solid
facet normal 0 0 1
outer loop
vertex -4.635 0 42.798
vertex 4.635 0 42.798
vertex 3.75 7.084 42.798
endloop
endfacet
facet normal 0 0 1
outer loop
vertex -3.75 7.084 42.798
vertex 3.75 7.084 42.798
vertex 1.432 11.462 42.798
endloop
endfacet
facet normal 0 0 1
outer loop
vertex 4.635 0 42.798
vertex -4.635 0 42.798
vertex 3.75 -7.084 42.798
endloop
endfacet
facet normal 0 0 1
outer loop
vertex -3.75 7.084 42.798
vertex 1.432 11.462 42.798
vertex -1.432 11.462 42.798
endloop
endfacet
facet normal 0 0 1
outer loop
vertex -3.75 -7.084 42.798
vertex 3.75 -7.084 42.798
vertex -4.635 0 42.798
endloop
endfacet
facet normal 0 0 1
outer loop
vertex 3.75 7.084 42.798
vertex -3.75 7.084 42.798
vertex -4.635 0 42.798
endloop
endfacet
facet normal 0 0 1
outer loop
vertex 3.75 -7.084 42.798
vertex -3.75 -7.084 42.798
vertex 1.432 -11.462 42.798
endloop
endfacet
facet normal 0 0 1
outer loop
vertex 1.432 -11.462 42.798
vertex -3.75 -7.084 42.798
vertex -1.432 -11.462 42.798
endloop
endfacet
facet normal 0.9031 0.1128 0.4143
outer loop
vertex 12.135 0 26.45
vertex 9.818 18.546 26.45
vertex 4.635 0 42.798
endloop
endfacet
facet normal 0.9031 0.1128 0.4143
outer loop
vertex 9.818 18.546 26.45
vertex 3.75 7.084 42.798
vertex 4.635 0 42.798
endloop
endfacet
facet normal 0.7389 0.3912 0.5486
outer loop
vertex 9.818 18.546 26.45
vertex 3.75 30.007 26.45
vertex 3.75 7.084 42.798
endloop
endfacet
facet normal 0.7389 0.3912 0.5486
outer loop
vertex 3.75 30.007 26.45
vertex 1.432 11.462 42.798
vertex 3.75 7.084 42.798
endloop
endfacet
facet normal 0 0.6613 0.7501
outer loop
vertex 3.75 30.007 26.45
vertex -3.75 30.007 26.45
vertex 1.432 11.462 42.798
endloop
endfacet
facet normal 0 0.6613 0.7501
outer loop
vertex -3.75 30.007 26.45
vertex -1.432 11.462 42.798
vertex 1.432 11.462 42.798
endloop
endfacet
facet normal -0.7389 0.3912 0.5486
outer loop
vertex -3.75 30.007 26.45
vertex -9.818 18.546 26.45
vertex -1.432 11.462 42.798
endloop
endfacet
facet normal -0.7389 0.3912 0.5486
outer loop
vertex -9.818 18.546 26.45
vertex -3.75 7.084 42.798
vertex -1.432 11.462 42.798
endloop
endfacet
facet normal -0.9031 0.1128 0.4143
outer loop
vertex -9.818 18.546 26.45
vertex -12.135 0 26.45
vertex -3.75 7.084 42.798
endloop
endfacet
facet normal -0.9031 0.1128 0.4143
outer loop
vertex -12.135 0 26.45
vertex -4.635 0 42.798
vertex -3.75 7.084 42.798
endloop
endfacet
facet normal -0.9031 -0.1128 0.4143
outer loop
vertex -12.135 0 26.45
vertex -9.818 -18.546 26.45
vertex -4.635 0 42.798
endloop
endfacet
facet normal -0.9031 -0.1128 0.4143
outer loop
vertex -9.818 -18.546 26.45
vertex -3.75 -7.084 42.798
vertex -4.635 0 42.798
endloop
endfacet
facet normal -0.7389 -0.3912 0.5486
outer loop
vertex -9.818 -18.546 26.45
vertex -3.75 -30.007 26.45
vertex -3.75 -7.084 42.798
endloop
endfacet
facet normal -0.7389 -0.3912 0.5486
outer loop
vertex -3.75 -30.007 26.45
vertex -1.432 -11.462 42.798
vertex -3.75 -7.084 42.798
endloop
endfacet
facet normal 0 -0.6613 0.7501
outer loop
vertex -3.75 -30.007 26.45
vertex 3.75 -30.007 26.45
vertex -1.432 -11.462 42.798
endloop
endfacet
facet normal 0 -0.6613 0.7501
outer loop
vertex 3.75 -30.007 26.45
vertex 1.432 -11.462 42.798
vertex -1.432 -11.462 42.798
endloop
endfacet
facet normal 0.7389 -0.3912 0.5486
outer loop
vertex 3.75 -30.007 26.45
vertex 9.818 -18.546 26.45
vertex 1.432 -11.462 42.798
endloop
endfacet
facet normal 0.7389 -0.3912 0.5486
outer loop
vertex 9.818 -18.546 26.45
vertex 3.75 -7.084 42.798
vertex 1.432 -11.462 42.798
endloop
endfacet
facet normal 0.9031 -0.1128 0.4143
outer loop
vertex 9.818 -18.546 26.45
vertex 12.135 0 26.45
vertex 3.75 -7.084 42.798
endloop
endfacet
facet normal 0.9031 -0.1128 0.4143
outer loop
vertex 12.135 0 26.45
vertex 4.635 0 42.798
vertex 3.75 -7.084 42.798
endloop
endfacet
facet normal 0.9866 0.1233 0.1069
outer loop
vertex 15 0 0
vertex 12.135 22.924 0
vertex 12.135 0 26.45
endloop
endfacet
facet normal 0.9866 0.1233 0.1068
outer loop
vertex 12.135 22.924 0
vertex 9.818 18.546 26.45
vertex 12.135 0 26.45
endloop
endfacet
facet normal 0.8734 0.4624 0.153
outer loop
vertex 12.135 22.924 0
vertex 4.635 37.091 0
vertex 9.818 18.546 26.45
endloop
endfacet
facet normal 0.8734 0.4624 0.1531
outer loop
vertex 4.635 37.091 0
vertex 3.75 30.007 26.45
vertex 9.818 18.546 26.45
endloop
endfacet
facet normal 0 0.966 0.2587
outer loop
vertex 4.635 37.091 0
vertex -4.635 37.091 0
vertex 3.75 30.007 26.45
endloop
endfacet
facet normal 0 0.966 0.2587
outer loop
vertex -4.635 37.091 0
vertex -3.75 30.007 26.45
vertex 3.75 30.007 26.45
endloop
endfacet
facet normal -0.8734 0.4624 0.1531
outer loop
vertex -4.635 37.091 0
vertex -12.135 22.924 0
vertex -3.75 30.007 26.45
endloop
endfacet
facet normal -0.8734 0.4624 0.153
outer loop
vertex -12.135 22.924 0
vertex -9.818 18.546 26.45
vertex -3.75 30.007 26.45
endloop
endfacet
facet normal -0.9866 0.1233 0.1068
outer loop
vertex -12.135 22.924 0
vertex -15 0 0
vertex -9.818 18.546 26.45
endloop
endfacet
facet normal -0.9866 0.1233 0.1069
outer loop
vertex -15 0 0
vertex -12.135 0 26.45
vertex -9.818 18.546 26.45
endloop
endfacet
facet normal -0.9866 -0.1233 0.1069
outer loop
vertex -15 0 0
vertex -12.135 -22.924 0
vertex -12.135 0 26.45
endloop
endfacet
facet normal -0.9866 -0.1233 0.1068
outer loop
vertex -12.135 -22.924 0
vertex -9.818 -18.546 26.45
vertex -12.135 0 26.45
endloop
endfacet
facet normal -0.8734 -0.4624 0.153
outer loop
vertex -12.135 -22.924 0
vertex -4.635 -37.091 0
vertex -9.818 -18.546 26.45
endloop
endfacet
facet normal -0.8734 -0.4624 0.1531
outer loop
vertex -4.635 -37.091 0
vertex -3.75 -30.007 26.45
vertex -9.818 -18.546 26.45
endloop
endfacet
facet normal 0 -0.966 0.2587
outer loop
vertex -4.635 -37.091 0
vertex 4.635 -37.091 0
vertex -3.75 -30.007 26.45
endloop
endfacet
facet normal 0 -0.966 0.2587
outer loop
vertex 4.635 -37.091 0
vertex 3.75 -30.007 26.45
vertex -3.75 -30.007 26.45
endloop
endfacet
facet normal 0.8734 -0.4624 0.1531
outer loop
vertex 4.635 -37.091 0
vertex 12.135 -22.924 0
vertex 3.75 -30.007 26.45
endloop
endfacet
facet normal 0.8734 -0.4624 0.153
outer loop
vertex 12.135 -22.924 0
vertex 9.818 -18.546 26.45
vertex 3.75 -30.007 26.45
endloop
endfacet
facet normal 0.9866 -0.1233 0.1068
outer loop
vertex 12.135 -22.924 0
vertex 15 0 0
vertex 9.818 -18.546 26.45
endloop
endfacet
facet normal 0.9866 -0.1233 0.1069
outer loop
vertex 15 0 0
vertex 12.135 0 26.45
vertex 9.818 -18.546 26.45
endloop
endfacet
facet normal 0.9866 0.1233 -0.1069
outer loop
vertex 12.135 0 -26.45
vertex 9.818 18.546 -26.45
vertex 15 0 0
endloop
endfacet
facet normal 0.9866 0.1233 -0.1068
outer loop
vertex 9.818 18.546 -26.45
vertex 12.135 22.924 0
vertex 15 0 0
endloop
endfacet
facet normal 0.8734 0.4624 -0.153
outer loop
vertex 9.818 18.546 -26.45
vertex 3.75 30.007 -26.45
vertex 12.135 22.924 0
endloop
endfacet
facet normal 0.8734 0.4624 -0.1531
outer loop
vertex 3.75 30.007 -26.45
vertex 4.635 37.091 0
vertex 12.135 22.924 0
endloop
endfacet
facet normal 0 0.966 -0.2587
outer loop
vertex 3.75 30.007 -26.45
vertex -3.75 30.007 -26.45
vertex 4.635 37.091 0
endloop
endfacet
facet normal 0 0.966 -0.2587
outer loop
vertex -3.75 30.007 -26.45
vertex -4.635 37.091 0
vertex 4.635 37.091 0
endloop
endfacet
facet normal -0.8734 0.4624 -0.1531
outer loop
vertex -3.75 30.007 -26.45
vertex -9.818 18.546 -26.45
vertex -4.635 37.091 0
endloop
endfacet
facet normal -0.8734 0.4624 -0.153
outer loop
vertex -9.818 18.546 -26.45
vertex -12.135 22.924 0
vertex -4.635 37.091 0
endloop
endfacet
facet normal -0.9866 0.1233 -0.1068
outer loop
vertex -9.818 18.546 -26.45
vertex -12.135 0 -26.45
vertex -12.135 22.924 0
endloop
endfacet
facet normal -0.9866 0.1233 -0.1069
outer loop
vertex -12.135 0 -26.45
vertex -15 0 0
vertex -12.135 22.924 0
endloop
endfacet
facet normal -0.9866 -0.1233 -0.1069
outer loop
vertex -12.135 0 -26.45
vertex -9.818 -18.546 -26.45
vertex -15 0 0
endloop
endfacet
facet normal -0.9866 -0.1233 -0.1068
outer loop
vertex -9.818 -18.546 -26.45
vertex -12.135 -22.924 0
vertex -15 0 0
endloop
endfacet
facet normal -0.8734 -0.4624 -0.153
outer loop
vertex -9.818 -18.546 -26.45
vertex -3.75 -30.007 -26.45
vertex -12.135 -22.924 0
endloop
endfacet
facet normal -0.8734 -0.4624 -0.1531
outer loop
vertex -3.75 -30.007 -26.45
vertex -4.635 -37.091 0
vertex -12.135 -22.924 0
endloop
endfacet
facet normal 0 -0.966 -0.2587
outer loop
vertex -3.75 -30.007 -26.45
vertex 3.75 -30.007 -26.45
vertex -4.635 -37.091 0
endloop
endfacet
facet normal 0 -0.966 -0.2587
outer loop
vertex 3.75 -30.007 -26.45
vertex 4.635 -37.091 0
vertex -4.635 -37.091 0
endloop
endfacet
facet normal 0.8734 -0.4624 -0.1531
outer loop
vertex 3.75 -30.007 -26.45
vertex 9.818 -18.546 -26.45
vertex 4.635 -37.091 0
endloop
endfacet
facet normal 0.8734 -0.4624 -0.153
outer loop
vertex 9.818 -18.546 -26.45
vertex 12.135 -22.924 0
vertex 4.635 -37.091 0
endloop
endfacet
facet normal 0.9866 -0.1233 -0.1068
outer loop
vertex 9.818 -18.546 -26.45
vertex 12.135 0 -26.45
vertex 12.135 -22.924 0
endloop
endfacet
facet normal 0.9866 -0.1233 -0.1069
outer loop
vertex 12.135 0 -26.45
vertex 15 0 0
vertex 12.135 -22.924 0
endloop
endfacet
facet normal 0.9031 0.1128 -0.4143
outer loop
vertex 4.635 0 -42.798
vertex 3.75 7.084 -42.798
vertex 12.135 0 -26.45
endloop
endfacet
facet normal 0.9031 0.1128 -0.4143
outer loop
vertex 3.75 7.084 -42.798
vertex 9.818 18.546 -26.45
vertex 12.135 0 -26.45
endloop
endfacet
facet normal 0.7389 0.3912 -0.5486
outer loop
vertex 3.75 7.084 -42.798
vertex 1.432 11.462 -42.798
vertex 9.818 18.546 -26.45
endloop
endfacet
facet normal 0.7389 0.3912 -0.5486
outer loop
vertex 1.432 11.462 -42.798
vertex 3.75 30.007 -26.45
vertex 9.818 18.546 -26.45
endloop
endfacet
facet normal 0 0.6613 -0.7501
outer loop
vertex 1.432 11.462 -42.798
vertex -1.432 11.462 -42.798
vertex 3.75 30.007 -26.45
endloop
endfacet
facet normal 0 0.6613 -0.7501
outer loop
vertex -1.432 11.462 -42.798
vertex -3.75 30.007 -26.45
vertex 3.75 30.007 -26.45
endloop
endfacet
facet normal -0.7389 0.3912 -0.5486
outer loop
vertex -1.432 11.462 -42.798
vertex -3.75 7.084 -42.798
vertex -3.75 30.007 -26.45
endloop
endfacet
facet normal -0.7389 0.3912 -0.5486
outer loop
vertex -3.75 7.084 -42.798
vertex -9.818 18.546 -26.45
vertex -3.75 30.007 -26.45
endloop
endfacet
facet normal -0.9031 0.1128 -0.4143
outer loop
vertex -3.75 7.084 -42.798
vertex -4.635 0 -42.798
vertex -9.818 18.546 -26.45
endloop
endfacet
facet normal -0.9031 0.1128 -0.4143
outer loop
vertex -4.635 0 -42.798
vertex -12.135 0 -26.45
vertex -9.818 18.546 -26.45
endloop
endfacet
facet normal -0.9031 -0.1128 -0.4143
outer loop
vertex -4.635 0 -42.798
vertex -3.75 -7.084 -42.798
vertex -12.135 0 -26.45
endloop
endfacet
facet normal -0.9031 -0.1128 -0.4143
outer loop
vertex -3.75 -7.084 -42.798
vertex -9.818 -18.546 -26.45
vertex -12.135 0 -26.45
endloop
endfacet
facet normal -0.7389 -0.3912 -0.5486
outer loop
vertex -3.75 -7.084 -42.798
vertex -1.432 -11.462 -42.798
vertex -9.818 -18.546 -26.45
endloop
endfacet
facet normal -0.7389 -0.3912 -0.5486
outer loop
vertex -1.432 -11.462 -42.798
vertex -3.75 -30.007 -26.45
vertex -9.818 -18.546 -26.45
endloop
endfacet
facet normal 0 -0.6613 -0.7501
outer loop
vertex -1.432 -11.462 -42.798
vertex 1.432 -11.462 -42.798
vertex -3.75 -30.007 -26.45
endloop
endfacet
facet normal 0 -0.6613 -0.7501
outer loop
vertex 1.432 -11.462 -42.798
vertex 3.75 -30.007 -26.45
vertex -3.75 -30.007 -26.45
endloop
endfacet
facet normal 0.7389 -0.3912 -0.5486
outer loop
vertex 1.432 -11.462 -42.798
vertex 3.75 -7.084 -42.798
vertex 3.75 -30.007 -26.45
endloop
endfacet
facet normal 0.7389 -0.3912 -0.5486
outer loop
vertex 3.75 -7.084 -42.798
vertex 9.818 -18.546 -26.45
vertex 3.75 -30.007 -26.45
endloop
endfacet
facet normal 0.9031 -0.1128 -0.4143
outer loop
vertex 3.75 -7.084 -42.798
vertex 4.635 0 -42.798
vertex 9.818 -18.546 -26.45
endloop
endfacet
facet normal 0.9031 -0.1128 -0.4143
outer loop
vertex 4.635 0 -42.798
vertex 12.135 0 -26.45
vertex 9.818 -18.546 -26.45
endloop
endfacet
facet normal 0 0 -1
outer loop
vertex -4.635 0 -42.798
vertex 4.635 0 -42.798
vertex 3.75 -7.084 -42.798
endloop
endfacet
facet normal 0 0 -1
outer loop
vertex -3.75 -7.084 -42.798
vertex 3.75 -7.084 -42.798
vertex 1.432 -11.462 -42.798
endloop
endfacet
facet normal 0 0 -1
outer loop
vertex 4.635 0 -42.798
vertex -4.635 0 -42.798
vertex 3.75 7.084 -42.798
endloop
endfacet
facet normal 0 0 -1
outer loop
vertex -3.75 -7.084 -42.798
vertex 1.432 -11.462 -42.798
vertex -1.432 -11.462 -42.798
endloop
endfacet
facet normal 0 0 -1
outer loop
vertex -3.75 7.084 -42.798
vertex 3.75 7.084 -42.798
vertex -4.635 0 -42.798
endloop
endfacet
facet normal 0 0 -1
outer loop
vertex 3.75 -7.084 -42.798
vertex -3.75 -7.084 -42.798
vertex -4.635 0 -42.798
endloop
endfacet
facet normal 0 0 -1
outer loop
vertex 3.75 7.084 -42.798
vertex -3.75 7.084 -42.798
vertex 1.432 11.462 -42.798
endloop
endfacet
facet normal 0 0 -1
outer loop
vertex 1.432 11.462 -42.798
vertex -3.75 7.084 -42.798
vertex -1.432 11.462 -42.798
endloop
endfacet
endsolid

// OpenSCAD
// Generated by SolidPython 1.0.1 on 2020-07-29 00:46:46


scale(v = [5, 13, 15]) {
	sphere(r = 3);
}
/***********************************************
*********      SolidPython code:      **********
************************************************
 
# import packages: SolidPython
from solid import *
from solid.utils import *
from itertools import chain, combinations, permutations


class Resize:

    def __init__(self, scad_file):
        self.scad_file = scad_file
        #self.scad_file = import_scad(scad_file)
        # cone/cylinder param:
        self.r1 = 0
        self.r2 = 0
        self.h = 0
        # rectangular prism param:
        self.w = 0
        self.l = 0
        # ellipse param:
        self.r = 0

    # import OpenScad code (file name corresponds to shape)


    # classify shape + parameters
    def assign(self, param1, param2, param3):
        if self.scad_file == 'cone.scad':
            self.r1 = param1
            self.r2 = param2
            self.h = param3
        elif self.scad_file == 'cylinder.scad':
            self.r1 = param1
            self.r2 = param2
            self.h = param3
        elif self.scad_file == 'rectangularPrism.scad':
            self.h = param1
            self.l = param2
            self.w = param3
        else:
            self.r = param1
            self.h = param2

    # resize parameters
    def iterate(self):
        x = range(3, 20, 2)
        i = 1
        if self.scad_file == 'cone.scad':
            tempList = list(permutations(x, 2))
            for temp in tempList:
                param1 = temp[0]
                param2 = temp[1]
                filepath = 'produced_scad_files/' + 'cone' + str(param1) + '_' + str(param2) + '_' + '.scad'
                scad_render_to_file(cylinder(h=param1, r1=param2, r2=0), filepath)

        elif self.scad_file == 'cylinder.scad':
            tempList = list(permutations(x, 3))
            for temp in tempList:
                param1 = temp[0]
                param2 = temp[1]
                filepath = 'produced_scad_files/' + 'cylinder' + str(param1) + '_' + str(param2) + '_' + '.scad'
                scad_render_to_file(cylinder(h=param1, r1=param2, r2=param2), filepath)

        elif self.scad_file == 'rectangularPrism.scad':
            tempList = list(permutations(x, 3))
            for temp in tempList:
                param1 = temp[0]
                param2 = temp[1]
                param3 = temp[2]
                filepath = 'produced_scad_files/' + 'rectangularPrism' + str(param1) + '_' + str(param2) + '_' + str(
                    param3) + '.scad'
                scad_render_to_file(cube(size=(param1, param2, param3)), filepath)

        elif self.scad_file == 'ellipse.scad':
            tempList = list(permutations(x, 4))
            for temp in tempList:
                param1 = temp[0]
                param2 = temp[1]
                param3 = temp[2]
                param4 = temp[3]
                filepath = 'produced_scad_files/' + 'ellipse' + str(param1) + '_' + str(param2) + '_' + str(param3) + '_' + str(param4) + '.scad'
                scad_render_to_file(scale([param1, param2, param3])(sphere(r=param4)), filepath)

    def render_to_scadfile(self):
        scad_render_to_file(scad, 'example.scad') 
 
************************************************/
